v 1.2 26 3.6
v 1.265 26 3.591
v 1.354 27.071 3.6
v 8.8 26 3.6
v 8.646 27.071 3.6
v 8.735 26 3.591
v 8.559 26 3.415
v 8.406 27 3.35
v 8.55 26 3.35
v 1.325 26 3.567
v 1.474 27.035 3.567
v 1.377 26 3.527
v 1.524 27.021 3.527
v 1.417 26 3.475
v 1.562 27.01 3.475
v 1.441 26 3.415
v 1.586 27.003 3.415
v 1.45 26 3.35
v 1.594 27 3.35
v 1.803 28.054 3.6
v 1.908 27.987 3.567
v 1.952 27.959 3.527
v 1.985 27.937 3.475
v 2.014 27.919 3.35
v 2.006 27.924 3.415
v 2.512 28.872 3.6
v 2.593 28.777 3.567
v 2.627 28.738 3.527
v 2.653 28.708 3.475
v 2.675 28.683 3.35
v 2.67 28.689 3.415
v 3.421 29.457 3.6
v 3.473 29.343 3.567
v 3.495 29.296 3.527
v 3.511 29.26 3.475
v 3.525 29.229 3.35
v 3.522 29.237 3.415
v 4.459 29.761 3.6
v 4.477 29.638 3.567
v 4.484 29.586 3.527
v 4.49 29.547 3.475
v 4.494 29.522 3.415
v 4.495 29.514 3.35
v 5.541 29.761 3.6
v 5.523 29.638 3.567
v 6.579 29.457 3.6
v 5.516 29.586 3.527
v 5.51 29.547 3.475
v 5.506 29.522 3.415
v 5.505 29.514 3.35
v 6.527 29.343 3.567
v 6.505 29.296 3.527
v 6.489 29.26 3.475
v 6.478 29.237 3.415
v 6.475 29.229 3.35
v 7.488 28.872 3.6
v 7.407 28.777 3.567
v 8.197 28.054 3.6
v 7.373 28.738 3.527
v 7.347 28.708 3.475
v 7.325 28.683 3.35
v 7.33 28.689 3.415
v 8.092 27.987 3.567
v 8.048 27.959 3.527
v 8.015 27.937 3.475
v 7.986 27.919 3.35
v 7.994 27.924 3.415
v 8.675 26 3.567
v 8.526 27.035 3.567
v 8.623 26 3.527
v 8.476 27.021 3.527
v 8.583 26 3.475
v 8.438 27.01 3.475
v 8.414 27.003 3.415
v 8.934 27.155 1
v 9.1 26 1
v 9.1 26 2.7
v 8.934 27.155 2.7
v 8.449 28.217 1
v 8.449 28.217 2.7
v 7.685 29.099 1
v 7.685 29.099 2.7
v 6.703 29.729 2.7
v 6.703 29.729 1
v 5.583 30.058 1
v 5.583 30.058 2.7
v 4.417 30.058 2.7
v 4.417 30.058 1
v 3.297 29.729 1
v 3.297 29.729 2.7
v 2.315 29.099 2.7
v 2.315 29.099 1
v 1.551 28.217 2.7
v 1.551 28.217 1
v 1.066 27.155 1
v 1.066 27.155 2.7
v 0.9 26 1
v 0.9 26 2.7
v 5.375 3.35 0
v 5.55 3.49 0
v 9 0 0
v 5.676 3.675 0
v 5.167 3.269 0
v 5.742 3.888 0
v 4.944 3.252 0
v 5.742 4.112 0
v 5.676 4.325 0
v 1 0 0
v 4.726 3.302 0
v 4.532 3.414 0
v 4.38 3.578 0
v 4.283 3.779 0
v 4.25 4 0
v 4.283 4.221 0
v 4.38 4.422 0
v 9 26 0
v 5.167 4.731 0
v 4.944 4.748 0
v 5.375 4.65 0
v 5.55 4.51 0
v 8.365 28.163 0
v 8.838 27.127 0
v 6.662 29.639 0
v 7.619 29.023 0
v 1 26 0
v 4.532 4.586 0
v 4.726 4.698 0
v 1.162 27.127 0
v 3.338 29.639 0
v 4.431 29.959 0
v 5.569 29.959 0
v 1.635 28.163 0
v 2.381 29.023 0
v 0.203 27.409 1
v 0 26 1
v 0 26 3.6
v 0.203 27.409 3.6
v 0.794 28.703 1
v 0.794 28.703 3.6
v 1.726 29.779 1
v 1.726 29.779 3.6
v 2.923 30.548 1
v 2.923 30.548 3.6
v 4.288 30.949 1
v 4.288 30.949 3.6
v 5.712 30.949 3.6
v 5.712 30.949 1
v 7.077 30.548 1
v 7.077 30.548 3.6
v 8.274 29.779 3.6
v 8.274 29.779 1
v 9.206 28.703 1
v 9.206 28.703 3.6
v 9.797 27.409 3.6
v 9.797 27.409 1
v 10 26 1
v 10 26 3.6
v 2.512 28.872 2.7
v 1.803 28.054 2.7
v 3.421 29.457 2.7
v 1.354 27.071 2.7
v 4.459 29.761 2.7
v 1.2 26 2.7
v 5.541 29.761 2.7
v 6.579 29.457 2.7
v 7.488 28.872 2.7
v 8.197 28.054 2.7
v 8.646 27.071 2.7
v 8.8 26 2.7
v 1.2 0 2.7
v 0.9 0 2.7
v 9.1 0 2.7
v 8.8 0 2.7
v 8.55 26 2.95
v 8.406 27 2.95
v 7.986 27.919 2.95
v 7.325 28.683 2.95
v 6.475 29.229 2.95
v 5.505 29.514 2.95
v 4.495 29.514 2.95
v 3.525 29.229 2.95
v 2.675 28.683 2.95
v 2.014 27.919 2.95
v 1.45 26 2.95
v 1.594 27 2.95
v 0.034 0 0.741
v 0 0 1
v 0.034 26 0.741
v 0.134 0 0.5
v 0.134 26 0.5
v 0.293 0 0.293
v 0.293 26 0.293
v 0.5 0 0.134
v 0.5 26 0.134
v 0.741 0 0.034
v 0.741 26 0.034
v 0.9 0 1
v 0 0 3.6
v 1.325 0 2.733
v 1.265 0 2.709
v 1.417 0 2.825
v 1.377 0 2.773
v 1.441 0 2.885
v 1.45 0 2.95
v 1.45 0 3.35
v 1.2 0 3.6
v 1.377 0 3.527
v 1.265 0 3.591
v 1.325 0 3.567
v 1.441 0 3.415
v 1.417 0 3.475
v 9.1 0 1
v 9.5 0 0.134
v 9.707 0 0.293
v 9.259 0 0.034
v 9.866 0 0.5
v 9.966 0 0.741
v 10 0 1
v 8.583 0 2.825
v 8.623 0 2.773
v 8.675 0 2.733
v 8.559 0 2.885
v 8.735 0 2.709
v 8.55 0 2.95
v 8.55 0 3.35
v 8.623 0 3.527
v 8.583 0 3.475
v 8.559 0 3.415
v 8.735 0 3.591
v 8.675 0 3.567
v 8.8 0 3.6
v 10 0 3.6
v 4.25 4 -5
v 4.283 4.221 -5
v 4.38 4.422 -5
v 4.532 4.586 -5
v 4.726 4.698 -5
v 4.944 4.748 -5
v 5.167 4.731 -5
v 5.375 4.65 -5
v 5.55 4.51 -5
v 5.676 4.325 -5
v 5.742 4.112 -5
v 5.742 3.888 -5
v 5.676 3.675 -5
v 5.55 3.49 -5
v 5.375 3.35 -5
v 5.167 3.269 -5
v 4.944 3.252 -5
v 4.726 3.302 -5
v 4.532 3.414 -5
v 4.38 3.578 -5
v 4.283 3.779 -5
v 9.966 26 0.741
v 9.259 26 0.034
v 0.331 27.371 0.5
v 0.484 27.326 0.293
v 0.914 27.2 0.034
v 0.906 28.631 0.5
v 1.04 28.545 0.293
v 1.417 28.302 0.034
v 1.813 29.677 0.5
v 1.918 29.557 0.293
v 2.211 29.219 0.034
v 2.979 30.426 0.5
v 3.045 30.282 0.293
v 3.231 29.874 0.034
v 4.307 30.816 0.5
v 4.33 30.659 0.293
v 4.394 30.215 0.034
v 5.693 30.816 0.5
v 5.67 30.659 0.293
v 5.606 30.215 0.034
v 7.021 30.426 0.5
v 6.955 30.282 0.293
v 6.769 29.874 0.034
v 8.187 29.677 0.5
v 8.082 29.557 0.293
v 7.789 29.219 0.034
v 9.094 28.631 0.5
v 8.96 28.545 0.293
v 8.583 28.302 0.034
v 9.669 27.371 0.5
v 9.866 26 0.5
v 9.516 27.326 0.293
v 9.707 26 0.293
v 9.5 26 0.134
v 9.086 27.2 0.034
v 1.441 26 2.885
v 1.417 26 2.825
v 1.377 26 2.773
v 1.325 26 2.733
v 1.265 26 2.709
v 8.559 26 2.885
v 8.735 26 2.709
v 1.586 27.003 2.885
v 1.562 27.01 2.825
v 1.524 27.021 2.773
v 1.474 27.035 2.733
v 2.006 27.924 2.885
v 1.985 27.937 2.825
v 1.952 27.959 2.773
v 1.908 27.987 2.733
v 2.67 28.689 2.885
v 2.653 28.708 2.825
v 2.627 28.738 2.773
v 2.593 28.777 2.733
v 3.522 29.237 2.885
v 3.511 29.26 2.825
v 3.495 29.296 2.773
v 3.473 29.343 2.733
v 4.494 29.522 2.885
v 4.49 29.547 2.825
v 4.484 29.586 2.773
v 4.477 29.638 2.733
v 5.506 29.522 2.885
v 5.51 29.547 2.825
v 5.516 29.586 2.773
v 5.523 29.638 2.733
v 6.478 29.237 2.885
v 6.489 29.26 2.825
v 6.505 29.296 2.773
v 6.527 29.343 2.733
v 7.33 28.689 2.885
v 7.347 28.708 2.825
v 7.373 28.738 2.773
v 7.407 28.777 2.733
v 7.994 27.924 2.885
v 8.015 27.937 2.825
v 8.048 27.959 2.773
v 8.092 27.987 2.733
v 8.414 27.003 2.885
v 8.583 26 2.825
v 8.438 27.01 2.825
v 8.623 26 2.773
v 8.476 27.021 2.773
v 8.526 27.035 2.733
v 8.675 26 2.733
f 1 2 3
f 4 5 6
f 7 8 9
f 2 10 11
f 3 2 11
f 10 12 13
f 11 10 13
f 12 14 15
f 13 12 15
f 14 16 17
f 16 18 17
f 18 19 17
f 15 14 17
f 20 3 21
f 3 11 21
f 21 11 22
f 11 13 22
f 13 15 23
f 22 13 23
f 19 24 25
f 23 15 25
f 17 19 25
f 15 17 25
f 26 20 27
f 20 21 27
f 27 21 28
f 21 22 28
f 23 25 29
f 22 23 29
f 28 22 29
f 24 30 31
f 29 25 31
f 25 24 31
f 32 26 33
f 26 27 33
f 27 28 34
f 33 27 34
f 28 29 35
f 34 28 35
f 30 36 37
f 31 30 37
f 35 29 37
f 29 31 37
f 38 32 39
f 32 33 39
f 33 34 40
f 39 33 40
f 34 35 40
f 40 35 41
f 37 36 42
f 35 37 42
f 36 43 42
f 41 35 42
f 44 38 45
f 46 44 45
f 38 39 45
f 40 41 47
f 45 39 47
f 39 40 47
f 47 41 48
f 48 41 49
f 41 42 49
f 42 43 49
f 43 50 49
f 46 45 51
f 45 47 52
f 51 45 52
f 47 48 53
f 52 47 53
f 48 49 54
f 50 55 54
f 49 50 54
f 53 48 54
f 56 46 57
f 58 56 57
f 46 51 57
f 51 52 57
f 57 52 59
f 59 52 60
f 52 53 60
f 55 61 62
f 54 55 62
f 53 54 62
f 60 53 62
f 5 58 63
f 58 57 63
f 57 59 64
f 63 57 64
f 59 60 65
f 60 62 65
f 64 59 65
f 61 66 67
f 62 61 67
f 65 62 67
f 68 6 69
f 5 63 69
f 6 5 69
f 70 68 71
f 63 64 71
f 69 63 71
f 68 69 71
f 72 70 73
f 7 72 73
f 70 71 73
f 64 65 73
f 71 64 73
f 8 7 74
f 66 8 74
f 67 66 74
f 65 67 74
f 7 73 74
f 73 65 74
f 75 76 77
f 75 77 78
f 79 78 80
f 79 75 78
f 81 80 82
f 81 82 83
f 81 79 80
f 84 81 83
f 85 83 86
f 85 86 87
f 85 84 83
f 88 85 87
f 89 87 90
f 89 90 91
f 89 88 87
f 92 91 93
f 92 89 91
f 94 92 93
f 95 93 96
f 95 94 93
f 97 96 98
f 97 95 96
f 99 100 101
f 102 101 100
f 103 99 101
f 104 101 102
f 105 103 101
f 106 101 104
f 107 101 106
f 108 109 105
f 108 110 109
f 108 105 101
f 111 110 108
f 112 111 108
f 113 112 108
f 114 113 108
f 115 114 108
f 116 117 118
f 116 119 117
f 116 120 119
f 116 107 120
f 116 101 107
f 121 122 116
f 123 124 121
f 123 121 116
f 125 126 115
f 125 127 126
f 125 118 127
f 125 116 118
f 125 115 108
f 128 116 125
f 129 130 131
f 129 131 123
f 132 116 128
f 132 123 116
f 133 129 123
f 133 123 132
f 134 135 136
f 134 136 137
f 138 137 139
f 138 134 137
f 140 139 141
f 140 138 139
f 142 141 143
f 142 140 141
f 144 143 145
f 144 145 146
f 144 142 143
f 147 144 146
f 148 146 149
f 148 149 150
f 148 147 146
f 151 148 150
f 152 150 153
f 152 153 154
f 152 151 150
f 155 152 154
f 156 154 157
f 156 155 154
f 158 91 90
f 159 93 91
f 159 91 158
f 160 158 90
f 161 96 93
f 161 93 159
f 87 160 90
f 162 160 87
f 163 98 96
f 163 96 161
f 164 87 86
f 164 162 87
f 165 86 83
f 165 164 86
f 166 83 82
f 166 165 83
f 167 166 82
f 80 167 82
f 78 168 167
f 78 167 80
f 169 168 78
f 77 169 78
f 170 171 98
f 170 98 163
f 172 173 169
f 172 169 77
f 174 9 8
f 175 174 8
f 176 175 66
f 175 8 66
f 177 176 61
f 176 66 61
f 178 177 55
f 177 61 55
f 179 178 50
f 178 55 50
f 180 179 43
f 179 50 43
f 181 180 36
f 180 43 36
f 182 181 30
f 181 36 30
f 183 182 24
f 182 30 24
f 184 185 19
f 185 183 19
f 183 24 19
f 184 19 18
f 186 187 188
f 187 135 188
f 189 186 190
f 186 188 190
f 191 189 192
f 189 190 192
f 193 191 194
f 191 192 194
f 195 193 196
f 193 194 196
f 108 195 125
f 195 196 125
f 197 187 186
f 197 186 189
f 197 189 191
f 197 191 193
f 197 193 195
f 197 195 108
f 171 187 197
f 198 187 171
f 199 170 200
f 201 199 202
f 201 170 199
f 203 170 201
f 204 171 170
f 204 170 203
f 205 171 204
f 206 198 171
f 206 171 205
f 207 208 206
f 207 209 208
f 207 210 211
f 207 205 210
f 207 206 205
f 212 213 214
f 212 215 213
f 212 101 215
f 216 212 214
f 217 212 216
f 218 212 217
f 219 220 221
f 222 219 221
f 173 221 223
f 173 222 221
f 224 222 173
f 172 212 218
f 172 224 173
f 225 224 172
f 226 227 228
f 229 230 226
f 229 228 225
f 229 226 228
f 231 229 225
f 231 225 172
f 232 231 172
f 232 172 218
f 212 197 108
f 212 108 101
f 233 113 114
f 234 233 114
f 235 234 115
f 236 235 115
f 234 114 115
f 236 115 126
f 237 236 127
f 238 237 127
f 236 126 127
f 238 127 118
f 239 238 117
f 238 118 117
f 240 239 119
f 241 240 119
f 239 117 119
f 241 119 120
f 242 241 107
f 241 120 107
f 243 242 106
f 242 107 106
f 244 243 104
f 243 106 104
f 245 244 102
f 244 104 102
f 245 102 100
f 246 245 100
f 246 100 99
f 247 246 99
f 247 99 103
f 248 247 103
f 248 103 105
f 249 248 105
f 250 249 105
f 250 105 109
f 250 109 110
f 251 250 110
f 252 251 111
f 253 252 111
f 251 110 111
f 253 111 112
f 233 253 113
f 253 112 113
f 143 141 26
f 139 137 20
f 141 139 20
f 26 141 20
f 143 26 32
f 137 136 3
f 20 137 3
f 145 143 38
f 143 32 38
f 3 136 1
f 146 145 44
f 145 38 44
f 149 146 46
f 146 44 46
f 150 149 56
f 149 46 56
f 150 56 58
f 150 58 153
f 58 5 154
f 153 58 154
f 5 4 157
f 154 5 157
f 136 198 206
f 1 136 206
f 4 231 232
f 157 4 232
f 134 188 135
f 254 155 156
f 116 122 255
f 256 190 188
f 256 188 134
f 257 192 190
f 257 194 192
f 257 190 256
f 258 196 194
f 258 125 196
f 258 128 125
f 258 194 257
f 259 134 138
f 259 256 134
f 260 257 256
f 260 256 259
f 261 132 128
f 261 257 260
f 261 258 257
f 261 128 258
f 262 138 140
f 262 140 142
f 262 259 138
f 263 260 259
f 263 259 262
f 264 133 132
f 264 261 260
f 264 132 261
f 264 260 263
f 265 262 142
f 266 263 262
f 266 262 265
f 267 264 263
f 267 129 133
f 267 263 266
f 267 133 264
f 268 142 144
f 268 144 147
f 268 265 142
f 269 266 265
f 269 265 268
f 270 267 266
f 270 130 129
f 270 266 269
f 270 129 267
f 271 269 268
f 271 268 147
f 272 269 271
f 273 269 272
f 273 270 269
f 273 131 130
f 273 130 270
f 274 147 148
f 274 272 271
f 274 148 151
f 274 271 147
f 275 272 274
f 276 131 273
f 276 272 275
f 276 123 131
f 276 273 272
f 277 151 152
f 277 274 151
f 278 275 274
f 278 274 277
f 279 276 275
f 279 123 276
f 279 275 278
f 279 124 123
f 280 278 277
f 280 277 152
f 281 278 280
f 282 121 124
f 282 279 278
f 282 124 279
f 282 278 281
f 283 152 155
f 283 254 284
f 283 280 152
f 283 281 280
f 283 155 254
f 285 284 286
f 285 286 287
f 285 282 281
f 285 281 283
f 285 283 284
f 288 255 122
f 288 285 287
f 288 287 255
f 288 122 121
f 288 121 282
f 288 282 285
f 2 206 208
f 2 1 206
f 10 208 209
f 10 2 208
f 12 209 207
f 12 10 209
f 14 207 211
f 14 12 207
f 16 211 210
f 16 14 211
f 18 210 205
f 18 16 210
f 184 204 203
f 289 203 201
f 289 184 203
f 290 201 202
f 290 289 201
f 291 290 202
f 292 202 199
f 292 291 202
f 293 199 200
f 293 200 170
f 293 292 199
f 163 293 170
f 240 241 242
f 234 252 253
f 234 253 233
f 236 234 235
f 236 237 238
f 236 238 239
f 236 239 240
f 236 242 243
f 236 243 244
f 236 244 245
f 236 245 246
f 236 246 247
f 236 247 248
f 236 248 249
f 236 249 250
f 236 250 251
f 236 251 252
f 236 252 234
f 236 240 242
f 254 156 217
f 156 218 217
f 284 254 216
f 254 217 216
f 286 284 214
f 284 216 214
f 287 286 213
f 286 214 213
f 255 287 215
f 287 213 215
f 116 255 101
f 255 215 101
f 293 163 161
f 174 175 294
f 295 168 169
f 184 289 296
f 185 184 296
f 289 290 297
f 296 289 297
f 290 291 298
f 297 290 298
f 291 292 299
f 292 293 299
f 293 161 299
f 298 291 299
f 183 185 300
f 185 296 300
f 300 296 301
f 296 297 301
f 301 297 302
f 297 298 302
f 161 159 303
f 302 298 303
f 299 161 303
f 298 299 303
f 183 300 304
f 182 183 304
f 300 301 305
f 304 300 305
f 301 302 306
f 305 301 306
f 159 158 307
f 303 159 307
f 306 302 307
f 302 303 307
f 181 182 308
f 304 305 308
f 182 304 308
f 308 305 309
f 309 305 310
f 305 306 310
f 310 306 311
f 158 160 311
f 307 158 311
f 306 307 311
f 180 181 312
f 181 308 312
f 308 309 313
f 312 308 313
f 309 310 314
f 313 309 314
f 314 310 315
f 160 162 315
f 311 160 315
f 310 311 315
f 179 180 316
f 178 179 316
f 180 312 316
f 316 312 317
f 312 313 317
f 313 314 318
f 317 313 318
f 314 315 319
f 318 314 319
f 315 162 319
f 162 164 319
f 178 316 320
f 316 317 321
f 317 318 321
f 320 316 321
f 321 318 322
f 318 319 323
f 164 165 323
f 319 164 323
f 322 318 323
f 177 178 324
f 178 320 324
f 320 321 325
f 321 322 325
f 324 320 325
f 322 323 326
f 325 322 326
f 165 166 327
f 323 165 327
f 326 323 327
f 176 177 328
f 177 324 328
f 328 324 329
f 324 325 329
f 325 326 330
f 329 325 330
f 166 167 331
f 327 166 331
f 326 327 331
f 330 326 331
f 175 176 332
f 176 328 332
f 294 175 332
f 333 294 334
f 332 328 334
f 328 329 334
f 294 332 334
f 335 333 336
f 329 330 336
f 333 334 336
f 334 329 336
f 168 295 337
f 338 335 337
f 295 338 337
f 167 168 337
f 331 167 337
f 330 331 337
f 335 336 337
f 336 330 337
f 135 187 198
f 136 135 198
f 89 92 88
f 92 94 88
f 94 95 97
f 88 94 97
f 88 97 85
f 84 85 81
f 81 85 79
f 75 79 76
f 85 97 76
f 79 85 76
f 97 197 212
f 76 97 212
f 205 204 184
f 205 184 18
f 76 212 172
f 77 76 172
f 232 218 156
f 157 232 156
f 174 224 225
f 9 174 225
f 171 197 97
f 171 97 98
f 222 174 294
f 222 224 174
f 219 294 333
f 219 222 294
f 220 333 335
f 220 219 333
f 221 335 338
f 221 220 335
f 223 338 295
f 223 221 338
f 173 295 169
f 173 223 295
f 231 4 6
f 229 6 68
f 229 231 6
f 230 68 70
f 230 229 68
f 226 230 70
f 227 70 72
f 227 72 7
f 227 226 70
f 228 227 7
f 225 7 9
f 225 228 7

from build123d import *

# Parameters (mm, degrees)
SKETCH1_W            = 10
SKETCH1_H            = 26
BOSS_EXTRUDE1_DEPTH  = 1
BOSS_EXTRUDE5_DEPTH  = 3.6
SKETCH6_W            = 1.45
SKETCH6_H            = 2.6
BOSS_EXTRUDE9_DEPTH  = 26
SKETCH7_W            = 0.55
SKETCH7_H            = 1.7
CUT_EXTRUDE1_DEPTH   = 26
CUT_EXTRUDE3_DEPTH   = 0.9
CUT_EXTRUDE4_DEPTH   = 1.7
FILLET1_R            = 0.25
FILLET2_R            = 1
SKETCH12_R           = 0.75
BOSS_EXTRUDE10_DEPTH = 5


with BuildPart() as part:
    # Sketch1 → Boss-Extrude1 (new body)
    with BuildSketch(Plane.XY):
        with Locations((5, 13)):
            Rectangle(SKETCH1_W, SKETCH1_H)
    extrude(amount=BOSS_EXTRUDE1_DEPTH)

    # Sketch2 → Boss-Extrude5 (add)
    with BuildSketch(Plane(origin=(0, 0, 0), x_dir=(-1, 0, 0), z_dir=(0, 0, -1))):
        with BuildLine():
            Line((-10, 26), (0, 26))
            ThreePointArc((0, 26), (-5, 31), (-10, 26))
        make_face()
    extrude(amount=-BOSS_EXTRUDE5_DEPTH)

    # Sketch6 → Boss-Extrude9 (add)
    with BuildSketch(Plane.XZ):
        with Locations((0.725, 2.3)):
            Rectangle(SKETCH6_W, SKETCH6_H)
        with Locations((9.275, 2.3)):
            Rectangle(SKETCH6_W, SKETCH6_H)
    extrude(amount=-BOSS_EXTRUDE9_DEPTH)

    # Sketch7 → Cut-Extrude1 (cut)
    with BuildSketch(Plane.XZ):
        with Locations((1.175, 1.85)):
            Rectangle(SKETCH7_W, SKETCH7_H)
        with Locations((8.825, 1.85)):
            Rectangle(SKETCH7_W, SKETCH7_H)
    extrude(amount=-CUT_EXTRUDE1_DEPTH, mode=Mode.SUBTRACT)

    # Sketch10 → Cut-Extrude3 (cut)
    with BuildSketch(Plane.XY.offset(3.6)):
        with BuildLine():
            Line((1.45, 26), (8.55, 26))
            ThreePointArc((8.55, 26), (5, 29.55), (1.45, 26))
        make_face()
    extrude(amount=-CUT_EXTRUDE3_DEPTH, mode=Mode.SUBTRACT)

    # Sketch11 → Cut-Extrude4 (cut)
    with BuildSketch(Plane.XY.offset(1)):
        with BuildLine():
            Line((0.9, 26), (9.1, 26))
            ThreePointArc((9.1, 26), (5, 30.1), (0.9, 26))
        make_face()
    extrude(amount=CUT_EXTRUDE4_DEPTH, mode=Mode.SUBTRACT)

    # Fillet1
    fillet1_edges = [part.edges().sort_by_distance(p)[0] for p in [
        (1.45, 13, 3.6),
        (8.55, 13, 3.6),
        (1.45, 13, 2.7),
        (8.55, 13, 2.7),
        (5, 29.55, 2.7),
        (5, 29.55, 3.6),
    ]]
    fillet(fillet1_edges, radius=FILLET1_R)

    # Fillet2
    fillet2_edges = [part.edges().sort_by_distance(p)[0] for p in [
        (5, 31, 0),
        (10, 13, 0),
        (0, 13, 0),
    ]]
    fillet(fillet2_edges, radius=FILLET2_R)

    # Sketch12 → Boss-Extrude10 (add)
    with BuildSketch(Plane(origin=(0, 0, 0), x_dir=(-1, 0, 0), z_dir=(0, 0, -1))):
        with Locations((-5, 4)):
            Circle(SKETCH12_R)
    extrude(amount=BOSS_EXTRUDE10_DEPTH)


solid = part.part
